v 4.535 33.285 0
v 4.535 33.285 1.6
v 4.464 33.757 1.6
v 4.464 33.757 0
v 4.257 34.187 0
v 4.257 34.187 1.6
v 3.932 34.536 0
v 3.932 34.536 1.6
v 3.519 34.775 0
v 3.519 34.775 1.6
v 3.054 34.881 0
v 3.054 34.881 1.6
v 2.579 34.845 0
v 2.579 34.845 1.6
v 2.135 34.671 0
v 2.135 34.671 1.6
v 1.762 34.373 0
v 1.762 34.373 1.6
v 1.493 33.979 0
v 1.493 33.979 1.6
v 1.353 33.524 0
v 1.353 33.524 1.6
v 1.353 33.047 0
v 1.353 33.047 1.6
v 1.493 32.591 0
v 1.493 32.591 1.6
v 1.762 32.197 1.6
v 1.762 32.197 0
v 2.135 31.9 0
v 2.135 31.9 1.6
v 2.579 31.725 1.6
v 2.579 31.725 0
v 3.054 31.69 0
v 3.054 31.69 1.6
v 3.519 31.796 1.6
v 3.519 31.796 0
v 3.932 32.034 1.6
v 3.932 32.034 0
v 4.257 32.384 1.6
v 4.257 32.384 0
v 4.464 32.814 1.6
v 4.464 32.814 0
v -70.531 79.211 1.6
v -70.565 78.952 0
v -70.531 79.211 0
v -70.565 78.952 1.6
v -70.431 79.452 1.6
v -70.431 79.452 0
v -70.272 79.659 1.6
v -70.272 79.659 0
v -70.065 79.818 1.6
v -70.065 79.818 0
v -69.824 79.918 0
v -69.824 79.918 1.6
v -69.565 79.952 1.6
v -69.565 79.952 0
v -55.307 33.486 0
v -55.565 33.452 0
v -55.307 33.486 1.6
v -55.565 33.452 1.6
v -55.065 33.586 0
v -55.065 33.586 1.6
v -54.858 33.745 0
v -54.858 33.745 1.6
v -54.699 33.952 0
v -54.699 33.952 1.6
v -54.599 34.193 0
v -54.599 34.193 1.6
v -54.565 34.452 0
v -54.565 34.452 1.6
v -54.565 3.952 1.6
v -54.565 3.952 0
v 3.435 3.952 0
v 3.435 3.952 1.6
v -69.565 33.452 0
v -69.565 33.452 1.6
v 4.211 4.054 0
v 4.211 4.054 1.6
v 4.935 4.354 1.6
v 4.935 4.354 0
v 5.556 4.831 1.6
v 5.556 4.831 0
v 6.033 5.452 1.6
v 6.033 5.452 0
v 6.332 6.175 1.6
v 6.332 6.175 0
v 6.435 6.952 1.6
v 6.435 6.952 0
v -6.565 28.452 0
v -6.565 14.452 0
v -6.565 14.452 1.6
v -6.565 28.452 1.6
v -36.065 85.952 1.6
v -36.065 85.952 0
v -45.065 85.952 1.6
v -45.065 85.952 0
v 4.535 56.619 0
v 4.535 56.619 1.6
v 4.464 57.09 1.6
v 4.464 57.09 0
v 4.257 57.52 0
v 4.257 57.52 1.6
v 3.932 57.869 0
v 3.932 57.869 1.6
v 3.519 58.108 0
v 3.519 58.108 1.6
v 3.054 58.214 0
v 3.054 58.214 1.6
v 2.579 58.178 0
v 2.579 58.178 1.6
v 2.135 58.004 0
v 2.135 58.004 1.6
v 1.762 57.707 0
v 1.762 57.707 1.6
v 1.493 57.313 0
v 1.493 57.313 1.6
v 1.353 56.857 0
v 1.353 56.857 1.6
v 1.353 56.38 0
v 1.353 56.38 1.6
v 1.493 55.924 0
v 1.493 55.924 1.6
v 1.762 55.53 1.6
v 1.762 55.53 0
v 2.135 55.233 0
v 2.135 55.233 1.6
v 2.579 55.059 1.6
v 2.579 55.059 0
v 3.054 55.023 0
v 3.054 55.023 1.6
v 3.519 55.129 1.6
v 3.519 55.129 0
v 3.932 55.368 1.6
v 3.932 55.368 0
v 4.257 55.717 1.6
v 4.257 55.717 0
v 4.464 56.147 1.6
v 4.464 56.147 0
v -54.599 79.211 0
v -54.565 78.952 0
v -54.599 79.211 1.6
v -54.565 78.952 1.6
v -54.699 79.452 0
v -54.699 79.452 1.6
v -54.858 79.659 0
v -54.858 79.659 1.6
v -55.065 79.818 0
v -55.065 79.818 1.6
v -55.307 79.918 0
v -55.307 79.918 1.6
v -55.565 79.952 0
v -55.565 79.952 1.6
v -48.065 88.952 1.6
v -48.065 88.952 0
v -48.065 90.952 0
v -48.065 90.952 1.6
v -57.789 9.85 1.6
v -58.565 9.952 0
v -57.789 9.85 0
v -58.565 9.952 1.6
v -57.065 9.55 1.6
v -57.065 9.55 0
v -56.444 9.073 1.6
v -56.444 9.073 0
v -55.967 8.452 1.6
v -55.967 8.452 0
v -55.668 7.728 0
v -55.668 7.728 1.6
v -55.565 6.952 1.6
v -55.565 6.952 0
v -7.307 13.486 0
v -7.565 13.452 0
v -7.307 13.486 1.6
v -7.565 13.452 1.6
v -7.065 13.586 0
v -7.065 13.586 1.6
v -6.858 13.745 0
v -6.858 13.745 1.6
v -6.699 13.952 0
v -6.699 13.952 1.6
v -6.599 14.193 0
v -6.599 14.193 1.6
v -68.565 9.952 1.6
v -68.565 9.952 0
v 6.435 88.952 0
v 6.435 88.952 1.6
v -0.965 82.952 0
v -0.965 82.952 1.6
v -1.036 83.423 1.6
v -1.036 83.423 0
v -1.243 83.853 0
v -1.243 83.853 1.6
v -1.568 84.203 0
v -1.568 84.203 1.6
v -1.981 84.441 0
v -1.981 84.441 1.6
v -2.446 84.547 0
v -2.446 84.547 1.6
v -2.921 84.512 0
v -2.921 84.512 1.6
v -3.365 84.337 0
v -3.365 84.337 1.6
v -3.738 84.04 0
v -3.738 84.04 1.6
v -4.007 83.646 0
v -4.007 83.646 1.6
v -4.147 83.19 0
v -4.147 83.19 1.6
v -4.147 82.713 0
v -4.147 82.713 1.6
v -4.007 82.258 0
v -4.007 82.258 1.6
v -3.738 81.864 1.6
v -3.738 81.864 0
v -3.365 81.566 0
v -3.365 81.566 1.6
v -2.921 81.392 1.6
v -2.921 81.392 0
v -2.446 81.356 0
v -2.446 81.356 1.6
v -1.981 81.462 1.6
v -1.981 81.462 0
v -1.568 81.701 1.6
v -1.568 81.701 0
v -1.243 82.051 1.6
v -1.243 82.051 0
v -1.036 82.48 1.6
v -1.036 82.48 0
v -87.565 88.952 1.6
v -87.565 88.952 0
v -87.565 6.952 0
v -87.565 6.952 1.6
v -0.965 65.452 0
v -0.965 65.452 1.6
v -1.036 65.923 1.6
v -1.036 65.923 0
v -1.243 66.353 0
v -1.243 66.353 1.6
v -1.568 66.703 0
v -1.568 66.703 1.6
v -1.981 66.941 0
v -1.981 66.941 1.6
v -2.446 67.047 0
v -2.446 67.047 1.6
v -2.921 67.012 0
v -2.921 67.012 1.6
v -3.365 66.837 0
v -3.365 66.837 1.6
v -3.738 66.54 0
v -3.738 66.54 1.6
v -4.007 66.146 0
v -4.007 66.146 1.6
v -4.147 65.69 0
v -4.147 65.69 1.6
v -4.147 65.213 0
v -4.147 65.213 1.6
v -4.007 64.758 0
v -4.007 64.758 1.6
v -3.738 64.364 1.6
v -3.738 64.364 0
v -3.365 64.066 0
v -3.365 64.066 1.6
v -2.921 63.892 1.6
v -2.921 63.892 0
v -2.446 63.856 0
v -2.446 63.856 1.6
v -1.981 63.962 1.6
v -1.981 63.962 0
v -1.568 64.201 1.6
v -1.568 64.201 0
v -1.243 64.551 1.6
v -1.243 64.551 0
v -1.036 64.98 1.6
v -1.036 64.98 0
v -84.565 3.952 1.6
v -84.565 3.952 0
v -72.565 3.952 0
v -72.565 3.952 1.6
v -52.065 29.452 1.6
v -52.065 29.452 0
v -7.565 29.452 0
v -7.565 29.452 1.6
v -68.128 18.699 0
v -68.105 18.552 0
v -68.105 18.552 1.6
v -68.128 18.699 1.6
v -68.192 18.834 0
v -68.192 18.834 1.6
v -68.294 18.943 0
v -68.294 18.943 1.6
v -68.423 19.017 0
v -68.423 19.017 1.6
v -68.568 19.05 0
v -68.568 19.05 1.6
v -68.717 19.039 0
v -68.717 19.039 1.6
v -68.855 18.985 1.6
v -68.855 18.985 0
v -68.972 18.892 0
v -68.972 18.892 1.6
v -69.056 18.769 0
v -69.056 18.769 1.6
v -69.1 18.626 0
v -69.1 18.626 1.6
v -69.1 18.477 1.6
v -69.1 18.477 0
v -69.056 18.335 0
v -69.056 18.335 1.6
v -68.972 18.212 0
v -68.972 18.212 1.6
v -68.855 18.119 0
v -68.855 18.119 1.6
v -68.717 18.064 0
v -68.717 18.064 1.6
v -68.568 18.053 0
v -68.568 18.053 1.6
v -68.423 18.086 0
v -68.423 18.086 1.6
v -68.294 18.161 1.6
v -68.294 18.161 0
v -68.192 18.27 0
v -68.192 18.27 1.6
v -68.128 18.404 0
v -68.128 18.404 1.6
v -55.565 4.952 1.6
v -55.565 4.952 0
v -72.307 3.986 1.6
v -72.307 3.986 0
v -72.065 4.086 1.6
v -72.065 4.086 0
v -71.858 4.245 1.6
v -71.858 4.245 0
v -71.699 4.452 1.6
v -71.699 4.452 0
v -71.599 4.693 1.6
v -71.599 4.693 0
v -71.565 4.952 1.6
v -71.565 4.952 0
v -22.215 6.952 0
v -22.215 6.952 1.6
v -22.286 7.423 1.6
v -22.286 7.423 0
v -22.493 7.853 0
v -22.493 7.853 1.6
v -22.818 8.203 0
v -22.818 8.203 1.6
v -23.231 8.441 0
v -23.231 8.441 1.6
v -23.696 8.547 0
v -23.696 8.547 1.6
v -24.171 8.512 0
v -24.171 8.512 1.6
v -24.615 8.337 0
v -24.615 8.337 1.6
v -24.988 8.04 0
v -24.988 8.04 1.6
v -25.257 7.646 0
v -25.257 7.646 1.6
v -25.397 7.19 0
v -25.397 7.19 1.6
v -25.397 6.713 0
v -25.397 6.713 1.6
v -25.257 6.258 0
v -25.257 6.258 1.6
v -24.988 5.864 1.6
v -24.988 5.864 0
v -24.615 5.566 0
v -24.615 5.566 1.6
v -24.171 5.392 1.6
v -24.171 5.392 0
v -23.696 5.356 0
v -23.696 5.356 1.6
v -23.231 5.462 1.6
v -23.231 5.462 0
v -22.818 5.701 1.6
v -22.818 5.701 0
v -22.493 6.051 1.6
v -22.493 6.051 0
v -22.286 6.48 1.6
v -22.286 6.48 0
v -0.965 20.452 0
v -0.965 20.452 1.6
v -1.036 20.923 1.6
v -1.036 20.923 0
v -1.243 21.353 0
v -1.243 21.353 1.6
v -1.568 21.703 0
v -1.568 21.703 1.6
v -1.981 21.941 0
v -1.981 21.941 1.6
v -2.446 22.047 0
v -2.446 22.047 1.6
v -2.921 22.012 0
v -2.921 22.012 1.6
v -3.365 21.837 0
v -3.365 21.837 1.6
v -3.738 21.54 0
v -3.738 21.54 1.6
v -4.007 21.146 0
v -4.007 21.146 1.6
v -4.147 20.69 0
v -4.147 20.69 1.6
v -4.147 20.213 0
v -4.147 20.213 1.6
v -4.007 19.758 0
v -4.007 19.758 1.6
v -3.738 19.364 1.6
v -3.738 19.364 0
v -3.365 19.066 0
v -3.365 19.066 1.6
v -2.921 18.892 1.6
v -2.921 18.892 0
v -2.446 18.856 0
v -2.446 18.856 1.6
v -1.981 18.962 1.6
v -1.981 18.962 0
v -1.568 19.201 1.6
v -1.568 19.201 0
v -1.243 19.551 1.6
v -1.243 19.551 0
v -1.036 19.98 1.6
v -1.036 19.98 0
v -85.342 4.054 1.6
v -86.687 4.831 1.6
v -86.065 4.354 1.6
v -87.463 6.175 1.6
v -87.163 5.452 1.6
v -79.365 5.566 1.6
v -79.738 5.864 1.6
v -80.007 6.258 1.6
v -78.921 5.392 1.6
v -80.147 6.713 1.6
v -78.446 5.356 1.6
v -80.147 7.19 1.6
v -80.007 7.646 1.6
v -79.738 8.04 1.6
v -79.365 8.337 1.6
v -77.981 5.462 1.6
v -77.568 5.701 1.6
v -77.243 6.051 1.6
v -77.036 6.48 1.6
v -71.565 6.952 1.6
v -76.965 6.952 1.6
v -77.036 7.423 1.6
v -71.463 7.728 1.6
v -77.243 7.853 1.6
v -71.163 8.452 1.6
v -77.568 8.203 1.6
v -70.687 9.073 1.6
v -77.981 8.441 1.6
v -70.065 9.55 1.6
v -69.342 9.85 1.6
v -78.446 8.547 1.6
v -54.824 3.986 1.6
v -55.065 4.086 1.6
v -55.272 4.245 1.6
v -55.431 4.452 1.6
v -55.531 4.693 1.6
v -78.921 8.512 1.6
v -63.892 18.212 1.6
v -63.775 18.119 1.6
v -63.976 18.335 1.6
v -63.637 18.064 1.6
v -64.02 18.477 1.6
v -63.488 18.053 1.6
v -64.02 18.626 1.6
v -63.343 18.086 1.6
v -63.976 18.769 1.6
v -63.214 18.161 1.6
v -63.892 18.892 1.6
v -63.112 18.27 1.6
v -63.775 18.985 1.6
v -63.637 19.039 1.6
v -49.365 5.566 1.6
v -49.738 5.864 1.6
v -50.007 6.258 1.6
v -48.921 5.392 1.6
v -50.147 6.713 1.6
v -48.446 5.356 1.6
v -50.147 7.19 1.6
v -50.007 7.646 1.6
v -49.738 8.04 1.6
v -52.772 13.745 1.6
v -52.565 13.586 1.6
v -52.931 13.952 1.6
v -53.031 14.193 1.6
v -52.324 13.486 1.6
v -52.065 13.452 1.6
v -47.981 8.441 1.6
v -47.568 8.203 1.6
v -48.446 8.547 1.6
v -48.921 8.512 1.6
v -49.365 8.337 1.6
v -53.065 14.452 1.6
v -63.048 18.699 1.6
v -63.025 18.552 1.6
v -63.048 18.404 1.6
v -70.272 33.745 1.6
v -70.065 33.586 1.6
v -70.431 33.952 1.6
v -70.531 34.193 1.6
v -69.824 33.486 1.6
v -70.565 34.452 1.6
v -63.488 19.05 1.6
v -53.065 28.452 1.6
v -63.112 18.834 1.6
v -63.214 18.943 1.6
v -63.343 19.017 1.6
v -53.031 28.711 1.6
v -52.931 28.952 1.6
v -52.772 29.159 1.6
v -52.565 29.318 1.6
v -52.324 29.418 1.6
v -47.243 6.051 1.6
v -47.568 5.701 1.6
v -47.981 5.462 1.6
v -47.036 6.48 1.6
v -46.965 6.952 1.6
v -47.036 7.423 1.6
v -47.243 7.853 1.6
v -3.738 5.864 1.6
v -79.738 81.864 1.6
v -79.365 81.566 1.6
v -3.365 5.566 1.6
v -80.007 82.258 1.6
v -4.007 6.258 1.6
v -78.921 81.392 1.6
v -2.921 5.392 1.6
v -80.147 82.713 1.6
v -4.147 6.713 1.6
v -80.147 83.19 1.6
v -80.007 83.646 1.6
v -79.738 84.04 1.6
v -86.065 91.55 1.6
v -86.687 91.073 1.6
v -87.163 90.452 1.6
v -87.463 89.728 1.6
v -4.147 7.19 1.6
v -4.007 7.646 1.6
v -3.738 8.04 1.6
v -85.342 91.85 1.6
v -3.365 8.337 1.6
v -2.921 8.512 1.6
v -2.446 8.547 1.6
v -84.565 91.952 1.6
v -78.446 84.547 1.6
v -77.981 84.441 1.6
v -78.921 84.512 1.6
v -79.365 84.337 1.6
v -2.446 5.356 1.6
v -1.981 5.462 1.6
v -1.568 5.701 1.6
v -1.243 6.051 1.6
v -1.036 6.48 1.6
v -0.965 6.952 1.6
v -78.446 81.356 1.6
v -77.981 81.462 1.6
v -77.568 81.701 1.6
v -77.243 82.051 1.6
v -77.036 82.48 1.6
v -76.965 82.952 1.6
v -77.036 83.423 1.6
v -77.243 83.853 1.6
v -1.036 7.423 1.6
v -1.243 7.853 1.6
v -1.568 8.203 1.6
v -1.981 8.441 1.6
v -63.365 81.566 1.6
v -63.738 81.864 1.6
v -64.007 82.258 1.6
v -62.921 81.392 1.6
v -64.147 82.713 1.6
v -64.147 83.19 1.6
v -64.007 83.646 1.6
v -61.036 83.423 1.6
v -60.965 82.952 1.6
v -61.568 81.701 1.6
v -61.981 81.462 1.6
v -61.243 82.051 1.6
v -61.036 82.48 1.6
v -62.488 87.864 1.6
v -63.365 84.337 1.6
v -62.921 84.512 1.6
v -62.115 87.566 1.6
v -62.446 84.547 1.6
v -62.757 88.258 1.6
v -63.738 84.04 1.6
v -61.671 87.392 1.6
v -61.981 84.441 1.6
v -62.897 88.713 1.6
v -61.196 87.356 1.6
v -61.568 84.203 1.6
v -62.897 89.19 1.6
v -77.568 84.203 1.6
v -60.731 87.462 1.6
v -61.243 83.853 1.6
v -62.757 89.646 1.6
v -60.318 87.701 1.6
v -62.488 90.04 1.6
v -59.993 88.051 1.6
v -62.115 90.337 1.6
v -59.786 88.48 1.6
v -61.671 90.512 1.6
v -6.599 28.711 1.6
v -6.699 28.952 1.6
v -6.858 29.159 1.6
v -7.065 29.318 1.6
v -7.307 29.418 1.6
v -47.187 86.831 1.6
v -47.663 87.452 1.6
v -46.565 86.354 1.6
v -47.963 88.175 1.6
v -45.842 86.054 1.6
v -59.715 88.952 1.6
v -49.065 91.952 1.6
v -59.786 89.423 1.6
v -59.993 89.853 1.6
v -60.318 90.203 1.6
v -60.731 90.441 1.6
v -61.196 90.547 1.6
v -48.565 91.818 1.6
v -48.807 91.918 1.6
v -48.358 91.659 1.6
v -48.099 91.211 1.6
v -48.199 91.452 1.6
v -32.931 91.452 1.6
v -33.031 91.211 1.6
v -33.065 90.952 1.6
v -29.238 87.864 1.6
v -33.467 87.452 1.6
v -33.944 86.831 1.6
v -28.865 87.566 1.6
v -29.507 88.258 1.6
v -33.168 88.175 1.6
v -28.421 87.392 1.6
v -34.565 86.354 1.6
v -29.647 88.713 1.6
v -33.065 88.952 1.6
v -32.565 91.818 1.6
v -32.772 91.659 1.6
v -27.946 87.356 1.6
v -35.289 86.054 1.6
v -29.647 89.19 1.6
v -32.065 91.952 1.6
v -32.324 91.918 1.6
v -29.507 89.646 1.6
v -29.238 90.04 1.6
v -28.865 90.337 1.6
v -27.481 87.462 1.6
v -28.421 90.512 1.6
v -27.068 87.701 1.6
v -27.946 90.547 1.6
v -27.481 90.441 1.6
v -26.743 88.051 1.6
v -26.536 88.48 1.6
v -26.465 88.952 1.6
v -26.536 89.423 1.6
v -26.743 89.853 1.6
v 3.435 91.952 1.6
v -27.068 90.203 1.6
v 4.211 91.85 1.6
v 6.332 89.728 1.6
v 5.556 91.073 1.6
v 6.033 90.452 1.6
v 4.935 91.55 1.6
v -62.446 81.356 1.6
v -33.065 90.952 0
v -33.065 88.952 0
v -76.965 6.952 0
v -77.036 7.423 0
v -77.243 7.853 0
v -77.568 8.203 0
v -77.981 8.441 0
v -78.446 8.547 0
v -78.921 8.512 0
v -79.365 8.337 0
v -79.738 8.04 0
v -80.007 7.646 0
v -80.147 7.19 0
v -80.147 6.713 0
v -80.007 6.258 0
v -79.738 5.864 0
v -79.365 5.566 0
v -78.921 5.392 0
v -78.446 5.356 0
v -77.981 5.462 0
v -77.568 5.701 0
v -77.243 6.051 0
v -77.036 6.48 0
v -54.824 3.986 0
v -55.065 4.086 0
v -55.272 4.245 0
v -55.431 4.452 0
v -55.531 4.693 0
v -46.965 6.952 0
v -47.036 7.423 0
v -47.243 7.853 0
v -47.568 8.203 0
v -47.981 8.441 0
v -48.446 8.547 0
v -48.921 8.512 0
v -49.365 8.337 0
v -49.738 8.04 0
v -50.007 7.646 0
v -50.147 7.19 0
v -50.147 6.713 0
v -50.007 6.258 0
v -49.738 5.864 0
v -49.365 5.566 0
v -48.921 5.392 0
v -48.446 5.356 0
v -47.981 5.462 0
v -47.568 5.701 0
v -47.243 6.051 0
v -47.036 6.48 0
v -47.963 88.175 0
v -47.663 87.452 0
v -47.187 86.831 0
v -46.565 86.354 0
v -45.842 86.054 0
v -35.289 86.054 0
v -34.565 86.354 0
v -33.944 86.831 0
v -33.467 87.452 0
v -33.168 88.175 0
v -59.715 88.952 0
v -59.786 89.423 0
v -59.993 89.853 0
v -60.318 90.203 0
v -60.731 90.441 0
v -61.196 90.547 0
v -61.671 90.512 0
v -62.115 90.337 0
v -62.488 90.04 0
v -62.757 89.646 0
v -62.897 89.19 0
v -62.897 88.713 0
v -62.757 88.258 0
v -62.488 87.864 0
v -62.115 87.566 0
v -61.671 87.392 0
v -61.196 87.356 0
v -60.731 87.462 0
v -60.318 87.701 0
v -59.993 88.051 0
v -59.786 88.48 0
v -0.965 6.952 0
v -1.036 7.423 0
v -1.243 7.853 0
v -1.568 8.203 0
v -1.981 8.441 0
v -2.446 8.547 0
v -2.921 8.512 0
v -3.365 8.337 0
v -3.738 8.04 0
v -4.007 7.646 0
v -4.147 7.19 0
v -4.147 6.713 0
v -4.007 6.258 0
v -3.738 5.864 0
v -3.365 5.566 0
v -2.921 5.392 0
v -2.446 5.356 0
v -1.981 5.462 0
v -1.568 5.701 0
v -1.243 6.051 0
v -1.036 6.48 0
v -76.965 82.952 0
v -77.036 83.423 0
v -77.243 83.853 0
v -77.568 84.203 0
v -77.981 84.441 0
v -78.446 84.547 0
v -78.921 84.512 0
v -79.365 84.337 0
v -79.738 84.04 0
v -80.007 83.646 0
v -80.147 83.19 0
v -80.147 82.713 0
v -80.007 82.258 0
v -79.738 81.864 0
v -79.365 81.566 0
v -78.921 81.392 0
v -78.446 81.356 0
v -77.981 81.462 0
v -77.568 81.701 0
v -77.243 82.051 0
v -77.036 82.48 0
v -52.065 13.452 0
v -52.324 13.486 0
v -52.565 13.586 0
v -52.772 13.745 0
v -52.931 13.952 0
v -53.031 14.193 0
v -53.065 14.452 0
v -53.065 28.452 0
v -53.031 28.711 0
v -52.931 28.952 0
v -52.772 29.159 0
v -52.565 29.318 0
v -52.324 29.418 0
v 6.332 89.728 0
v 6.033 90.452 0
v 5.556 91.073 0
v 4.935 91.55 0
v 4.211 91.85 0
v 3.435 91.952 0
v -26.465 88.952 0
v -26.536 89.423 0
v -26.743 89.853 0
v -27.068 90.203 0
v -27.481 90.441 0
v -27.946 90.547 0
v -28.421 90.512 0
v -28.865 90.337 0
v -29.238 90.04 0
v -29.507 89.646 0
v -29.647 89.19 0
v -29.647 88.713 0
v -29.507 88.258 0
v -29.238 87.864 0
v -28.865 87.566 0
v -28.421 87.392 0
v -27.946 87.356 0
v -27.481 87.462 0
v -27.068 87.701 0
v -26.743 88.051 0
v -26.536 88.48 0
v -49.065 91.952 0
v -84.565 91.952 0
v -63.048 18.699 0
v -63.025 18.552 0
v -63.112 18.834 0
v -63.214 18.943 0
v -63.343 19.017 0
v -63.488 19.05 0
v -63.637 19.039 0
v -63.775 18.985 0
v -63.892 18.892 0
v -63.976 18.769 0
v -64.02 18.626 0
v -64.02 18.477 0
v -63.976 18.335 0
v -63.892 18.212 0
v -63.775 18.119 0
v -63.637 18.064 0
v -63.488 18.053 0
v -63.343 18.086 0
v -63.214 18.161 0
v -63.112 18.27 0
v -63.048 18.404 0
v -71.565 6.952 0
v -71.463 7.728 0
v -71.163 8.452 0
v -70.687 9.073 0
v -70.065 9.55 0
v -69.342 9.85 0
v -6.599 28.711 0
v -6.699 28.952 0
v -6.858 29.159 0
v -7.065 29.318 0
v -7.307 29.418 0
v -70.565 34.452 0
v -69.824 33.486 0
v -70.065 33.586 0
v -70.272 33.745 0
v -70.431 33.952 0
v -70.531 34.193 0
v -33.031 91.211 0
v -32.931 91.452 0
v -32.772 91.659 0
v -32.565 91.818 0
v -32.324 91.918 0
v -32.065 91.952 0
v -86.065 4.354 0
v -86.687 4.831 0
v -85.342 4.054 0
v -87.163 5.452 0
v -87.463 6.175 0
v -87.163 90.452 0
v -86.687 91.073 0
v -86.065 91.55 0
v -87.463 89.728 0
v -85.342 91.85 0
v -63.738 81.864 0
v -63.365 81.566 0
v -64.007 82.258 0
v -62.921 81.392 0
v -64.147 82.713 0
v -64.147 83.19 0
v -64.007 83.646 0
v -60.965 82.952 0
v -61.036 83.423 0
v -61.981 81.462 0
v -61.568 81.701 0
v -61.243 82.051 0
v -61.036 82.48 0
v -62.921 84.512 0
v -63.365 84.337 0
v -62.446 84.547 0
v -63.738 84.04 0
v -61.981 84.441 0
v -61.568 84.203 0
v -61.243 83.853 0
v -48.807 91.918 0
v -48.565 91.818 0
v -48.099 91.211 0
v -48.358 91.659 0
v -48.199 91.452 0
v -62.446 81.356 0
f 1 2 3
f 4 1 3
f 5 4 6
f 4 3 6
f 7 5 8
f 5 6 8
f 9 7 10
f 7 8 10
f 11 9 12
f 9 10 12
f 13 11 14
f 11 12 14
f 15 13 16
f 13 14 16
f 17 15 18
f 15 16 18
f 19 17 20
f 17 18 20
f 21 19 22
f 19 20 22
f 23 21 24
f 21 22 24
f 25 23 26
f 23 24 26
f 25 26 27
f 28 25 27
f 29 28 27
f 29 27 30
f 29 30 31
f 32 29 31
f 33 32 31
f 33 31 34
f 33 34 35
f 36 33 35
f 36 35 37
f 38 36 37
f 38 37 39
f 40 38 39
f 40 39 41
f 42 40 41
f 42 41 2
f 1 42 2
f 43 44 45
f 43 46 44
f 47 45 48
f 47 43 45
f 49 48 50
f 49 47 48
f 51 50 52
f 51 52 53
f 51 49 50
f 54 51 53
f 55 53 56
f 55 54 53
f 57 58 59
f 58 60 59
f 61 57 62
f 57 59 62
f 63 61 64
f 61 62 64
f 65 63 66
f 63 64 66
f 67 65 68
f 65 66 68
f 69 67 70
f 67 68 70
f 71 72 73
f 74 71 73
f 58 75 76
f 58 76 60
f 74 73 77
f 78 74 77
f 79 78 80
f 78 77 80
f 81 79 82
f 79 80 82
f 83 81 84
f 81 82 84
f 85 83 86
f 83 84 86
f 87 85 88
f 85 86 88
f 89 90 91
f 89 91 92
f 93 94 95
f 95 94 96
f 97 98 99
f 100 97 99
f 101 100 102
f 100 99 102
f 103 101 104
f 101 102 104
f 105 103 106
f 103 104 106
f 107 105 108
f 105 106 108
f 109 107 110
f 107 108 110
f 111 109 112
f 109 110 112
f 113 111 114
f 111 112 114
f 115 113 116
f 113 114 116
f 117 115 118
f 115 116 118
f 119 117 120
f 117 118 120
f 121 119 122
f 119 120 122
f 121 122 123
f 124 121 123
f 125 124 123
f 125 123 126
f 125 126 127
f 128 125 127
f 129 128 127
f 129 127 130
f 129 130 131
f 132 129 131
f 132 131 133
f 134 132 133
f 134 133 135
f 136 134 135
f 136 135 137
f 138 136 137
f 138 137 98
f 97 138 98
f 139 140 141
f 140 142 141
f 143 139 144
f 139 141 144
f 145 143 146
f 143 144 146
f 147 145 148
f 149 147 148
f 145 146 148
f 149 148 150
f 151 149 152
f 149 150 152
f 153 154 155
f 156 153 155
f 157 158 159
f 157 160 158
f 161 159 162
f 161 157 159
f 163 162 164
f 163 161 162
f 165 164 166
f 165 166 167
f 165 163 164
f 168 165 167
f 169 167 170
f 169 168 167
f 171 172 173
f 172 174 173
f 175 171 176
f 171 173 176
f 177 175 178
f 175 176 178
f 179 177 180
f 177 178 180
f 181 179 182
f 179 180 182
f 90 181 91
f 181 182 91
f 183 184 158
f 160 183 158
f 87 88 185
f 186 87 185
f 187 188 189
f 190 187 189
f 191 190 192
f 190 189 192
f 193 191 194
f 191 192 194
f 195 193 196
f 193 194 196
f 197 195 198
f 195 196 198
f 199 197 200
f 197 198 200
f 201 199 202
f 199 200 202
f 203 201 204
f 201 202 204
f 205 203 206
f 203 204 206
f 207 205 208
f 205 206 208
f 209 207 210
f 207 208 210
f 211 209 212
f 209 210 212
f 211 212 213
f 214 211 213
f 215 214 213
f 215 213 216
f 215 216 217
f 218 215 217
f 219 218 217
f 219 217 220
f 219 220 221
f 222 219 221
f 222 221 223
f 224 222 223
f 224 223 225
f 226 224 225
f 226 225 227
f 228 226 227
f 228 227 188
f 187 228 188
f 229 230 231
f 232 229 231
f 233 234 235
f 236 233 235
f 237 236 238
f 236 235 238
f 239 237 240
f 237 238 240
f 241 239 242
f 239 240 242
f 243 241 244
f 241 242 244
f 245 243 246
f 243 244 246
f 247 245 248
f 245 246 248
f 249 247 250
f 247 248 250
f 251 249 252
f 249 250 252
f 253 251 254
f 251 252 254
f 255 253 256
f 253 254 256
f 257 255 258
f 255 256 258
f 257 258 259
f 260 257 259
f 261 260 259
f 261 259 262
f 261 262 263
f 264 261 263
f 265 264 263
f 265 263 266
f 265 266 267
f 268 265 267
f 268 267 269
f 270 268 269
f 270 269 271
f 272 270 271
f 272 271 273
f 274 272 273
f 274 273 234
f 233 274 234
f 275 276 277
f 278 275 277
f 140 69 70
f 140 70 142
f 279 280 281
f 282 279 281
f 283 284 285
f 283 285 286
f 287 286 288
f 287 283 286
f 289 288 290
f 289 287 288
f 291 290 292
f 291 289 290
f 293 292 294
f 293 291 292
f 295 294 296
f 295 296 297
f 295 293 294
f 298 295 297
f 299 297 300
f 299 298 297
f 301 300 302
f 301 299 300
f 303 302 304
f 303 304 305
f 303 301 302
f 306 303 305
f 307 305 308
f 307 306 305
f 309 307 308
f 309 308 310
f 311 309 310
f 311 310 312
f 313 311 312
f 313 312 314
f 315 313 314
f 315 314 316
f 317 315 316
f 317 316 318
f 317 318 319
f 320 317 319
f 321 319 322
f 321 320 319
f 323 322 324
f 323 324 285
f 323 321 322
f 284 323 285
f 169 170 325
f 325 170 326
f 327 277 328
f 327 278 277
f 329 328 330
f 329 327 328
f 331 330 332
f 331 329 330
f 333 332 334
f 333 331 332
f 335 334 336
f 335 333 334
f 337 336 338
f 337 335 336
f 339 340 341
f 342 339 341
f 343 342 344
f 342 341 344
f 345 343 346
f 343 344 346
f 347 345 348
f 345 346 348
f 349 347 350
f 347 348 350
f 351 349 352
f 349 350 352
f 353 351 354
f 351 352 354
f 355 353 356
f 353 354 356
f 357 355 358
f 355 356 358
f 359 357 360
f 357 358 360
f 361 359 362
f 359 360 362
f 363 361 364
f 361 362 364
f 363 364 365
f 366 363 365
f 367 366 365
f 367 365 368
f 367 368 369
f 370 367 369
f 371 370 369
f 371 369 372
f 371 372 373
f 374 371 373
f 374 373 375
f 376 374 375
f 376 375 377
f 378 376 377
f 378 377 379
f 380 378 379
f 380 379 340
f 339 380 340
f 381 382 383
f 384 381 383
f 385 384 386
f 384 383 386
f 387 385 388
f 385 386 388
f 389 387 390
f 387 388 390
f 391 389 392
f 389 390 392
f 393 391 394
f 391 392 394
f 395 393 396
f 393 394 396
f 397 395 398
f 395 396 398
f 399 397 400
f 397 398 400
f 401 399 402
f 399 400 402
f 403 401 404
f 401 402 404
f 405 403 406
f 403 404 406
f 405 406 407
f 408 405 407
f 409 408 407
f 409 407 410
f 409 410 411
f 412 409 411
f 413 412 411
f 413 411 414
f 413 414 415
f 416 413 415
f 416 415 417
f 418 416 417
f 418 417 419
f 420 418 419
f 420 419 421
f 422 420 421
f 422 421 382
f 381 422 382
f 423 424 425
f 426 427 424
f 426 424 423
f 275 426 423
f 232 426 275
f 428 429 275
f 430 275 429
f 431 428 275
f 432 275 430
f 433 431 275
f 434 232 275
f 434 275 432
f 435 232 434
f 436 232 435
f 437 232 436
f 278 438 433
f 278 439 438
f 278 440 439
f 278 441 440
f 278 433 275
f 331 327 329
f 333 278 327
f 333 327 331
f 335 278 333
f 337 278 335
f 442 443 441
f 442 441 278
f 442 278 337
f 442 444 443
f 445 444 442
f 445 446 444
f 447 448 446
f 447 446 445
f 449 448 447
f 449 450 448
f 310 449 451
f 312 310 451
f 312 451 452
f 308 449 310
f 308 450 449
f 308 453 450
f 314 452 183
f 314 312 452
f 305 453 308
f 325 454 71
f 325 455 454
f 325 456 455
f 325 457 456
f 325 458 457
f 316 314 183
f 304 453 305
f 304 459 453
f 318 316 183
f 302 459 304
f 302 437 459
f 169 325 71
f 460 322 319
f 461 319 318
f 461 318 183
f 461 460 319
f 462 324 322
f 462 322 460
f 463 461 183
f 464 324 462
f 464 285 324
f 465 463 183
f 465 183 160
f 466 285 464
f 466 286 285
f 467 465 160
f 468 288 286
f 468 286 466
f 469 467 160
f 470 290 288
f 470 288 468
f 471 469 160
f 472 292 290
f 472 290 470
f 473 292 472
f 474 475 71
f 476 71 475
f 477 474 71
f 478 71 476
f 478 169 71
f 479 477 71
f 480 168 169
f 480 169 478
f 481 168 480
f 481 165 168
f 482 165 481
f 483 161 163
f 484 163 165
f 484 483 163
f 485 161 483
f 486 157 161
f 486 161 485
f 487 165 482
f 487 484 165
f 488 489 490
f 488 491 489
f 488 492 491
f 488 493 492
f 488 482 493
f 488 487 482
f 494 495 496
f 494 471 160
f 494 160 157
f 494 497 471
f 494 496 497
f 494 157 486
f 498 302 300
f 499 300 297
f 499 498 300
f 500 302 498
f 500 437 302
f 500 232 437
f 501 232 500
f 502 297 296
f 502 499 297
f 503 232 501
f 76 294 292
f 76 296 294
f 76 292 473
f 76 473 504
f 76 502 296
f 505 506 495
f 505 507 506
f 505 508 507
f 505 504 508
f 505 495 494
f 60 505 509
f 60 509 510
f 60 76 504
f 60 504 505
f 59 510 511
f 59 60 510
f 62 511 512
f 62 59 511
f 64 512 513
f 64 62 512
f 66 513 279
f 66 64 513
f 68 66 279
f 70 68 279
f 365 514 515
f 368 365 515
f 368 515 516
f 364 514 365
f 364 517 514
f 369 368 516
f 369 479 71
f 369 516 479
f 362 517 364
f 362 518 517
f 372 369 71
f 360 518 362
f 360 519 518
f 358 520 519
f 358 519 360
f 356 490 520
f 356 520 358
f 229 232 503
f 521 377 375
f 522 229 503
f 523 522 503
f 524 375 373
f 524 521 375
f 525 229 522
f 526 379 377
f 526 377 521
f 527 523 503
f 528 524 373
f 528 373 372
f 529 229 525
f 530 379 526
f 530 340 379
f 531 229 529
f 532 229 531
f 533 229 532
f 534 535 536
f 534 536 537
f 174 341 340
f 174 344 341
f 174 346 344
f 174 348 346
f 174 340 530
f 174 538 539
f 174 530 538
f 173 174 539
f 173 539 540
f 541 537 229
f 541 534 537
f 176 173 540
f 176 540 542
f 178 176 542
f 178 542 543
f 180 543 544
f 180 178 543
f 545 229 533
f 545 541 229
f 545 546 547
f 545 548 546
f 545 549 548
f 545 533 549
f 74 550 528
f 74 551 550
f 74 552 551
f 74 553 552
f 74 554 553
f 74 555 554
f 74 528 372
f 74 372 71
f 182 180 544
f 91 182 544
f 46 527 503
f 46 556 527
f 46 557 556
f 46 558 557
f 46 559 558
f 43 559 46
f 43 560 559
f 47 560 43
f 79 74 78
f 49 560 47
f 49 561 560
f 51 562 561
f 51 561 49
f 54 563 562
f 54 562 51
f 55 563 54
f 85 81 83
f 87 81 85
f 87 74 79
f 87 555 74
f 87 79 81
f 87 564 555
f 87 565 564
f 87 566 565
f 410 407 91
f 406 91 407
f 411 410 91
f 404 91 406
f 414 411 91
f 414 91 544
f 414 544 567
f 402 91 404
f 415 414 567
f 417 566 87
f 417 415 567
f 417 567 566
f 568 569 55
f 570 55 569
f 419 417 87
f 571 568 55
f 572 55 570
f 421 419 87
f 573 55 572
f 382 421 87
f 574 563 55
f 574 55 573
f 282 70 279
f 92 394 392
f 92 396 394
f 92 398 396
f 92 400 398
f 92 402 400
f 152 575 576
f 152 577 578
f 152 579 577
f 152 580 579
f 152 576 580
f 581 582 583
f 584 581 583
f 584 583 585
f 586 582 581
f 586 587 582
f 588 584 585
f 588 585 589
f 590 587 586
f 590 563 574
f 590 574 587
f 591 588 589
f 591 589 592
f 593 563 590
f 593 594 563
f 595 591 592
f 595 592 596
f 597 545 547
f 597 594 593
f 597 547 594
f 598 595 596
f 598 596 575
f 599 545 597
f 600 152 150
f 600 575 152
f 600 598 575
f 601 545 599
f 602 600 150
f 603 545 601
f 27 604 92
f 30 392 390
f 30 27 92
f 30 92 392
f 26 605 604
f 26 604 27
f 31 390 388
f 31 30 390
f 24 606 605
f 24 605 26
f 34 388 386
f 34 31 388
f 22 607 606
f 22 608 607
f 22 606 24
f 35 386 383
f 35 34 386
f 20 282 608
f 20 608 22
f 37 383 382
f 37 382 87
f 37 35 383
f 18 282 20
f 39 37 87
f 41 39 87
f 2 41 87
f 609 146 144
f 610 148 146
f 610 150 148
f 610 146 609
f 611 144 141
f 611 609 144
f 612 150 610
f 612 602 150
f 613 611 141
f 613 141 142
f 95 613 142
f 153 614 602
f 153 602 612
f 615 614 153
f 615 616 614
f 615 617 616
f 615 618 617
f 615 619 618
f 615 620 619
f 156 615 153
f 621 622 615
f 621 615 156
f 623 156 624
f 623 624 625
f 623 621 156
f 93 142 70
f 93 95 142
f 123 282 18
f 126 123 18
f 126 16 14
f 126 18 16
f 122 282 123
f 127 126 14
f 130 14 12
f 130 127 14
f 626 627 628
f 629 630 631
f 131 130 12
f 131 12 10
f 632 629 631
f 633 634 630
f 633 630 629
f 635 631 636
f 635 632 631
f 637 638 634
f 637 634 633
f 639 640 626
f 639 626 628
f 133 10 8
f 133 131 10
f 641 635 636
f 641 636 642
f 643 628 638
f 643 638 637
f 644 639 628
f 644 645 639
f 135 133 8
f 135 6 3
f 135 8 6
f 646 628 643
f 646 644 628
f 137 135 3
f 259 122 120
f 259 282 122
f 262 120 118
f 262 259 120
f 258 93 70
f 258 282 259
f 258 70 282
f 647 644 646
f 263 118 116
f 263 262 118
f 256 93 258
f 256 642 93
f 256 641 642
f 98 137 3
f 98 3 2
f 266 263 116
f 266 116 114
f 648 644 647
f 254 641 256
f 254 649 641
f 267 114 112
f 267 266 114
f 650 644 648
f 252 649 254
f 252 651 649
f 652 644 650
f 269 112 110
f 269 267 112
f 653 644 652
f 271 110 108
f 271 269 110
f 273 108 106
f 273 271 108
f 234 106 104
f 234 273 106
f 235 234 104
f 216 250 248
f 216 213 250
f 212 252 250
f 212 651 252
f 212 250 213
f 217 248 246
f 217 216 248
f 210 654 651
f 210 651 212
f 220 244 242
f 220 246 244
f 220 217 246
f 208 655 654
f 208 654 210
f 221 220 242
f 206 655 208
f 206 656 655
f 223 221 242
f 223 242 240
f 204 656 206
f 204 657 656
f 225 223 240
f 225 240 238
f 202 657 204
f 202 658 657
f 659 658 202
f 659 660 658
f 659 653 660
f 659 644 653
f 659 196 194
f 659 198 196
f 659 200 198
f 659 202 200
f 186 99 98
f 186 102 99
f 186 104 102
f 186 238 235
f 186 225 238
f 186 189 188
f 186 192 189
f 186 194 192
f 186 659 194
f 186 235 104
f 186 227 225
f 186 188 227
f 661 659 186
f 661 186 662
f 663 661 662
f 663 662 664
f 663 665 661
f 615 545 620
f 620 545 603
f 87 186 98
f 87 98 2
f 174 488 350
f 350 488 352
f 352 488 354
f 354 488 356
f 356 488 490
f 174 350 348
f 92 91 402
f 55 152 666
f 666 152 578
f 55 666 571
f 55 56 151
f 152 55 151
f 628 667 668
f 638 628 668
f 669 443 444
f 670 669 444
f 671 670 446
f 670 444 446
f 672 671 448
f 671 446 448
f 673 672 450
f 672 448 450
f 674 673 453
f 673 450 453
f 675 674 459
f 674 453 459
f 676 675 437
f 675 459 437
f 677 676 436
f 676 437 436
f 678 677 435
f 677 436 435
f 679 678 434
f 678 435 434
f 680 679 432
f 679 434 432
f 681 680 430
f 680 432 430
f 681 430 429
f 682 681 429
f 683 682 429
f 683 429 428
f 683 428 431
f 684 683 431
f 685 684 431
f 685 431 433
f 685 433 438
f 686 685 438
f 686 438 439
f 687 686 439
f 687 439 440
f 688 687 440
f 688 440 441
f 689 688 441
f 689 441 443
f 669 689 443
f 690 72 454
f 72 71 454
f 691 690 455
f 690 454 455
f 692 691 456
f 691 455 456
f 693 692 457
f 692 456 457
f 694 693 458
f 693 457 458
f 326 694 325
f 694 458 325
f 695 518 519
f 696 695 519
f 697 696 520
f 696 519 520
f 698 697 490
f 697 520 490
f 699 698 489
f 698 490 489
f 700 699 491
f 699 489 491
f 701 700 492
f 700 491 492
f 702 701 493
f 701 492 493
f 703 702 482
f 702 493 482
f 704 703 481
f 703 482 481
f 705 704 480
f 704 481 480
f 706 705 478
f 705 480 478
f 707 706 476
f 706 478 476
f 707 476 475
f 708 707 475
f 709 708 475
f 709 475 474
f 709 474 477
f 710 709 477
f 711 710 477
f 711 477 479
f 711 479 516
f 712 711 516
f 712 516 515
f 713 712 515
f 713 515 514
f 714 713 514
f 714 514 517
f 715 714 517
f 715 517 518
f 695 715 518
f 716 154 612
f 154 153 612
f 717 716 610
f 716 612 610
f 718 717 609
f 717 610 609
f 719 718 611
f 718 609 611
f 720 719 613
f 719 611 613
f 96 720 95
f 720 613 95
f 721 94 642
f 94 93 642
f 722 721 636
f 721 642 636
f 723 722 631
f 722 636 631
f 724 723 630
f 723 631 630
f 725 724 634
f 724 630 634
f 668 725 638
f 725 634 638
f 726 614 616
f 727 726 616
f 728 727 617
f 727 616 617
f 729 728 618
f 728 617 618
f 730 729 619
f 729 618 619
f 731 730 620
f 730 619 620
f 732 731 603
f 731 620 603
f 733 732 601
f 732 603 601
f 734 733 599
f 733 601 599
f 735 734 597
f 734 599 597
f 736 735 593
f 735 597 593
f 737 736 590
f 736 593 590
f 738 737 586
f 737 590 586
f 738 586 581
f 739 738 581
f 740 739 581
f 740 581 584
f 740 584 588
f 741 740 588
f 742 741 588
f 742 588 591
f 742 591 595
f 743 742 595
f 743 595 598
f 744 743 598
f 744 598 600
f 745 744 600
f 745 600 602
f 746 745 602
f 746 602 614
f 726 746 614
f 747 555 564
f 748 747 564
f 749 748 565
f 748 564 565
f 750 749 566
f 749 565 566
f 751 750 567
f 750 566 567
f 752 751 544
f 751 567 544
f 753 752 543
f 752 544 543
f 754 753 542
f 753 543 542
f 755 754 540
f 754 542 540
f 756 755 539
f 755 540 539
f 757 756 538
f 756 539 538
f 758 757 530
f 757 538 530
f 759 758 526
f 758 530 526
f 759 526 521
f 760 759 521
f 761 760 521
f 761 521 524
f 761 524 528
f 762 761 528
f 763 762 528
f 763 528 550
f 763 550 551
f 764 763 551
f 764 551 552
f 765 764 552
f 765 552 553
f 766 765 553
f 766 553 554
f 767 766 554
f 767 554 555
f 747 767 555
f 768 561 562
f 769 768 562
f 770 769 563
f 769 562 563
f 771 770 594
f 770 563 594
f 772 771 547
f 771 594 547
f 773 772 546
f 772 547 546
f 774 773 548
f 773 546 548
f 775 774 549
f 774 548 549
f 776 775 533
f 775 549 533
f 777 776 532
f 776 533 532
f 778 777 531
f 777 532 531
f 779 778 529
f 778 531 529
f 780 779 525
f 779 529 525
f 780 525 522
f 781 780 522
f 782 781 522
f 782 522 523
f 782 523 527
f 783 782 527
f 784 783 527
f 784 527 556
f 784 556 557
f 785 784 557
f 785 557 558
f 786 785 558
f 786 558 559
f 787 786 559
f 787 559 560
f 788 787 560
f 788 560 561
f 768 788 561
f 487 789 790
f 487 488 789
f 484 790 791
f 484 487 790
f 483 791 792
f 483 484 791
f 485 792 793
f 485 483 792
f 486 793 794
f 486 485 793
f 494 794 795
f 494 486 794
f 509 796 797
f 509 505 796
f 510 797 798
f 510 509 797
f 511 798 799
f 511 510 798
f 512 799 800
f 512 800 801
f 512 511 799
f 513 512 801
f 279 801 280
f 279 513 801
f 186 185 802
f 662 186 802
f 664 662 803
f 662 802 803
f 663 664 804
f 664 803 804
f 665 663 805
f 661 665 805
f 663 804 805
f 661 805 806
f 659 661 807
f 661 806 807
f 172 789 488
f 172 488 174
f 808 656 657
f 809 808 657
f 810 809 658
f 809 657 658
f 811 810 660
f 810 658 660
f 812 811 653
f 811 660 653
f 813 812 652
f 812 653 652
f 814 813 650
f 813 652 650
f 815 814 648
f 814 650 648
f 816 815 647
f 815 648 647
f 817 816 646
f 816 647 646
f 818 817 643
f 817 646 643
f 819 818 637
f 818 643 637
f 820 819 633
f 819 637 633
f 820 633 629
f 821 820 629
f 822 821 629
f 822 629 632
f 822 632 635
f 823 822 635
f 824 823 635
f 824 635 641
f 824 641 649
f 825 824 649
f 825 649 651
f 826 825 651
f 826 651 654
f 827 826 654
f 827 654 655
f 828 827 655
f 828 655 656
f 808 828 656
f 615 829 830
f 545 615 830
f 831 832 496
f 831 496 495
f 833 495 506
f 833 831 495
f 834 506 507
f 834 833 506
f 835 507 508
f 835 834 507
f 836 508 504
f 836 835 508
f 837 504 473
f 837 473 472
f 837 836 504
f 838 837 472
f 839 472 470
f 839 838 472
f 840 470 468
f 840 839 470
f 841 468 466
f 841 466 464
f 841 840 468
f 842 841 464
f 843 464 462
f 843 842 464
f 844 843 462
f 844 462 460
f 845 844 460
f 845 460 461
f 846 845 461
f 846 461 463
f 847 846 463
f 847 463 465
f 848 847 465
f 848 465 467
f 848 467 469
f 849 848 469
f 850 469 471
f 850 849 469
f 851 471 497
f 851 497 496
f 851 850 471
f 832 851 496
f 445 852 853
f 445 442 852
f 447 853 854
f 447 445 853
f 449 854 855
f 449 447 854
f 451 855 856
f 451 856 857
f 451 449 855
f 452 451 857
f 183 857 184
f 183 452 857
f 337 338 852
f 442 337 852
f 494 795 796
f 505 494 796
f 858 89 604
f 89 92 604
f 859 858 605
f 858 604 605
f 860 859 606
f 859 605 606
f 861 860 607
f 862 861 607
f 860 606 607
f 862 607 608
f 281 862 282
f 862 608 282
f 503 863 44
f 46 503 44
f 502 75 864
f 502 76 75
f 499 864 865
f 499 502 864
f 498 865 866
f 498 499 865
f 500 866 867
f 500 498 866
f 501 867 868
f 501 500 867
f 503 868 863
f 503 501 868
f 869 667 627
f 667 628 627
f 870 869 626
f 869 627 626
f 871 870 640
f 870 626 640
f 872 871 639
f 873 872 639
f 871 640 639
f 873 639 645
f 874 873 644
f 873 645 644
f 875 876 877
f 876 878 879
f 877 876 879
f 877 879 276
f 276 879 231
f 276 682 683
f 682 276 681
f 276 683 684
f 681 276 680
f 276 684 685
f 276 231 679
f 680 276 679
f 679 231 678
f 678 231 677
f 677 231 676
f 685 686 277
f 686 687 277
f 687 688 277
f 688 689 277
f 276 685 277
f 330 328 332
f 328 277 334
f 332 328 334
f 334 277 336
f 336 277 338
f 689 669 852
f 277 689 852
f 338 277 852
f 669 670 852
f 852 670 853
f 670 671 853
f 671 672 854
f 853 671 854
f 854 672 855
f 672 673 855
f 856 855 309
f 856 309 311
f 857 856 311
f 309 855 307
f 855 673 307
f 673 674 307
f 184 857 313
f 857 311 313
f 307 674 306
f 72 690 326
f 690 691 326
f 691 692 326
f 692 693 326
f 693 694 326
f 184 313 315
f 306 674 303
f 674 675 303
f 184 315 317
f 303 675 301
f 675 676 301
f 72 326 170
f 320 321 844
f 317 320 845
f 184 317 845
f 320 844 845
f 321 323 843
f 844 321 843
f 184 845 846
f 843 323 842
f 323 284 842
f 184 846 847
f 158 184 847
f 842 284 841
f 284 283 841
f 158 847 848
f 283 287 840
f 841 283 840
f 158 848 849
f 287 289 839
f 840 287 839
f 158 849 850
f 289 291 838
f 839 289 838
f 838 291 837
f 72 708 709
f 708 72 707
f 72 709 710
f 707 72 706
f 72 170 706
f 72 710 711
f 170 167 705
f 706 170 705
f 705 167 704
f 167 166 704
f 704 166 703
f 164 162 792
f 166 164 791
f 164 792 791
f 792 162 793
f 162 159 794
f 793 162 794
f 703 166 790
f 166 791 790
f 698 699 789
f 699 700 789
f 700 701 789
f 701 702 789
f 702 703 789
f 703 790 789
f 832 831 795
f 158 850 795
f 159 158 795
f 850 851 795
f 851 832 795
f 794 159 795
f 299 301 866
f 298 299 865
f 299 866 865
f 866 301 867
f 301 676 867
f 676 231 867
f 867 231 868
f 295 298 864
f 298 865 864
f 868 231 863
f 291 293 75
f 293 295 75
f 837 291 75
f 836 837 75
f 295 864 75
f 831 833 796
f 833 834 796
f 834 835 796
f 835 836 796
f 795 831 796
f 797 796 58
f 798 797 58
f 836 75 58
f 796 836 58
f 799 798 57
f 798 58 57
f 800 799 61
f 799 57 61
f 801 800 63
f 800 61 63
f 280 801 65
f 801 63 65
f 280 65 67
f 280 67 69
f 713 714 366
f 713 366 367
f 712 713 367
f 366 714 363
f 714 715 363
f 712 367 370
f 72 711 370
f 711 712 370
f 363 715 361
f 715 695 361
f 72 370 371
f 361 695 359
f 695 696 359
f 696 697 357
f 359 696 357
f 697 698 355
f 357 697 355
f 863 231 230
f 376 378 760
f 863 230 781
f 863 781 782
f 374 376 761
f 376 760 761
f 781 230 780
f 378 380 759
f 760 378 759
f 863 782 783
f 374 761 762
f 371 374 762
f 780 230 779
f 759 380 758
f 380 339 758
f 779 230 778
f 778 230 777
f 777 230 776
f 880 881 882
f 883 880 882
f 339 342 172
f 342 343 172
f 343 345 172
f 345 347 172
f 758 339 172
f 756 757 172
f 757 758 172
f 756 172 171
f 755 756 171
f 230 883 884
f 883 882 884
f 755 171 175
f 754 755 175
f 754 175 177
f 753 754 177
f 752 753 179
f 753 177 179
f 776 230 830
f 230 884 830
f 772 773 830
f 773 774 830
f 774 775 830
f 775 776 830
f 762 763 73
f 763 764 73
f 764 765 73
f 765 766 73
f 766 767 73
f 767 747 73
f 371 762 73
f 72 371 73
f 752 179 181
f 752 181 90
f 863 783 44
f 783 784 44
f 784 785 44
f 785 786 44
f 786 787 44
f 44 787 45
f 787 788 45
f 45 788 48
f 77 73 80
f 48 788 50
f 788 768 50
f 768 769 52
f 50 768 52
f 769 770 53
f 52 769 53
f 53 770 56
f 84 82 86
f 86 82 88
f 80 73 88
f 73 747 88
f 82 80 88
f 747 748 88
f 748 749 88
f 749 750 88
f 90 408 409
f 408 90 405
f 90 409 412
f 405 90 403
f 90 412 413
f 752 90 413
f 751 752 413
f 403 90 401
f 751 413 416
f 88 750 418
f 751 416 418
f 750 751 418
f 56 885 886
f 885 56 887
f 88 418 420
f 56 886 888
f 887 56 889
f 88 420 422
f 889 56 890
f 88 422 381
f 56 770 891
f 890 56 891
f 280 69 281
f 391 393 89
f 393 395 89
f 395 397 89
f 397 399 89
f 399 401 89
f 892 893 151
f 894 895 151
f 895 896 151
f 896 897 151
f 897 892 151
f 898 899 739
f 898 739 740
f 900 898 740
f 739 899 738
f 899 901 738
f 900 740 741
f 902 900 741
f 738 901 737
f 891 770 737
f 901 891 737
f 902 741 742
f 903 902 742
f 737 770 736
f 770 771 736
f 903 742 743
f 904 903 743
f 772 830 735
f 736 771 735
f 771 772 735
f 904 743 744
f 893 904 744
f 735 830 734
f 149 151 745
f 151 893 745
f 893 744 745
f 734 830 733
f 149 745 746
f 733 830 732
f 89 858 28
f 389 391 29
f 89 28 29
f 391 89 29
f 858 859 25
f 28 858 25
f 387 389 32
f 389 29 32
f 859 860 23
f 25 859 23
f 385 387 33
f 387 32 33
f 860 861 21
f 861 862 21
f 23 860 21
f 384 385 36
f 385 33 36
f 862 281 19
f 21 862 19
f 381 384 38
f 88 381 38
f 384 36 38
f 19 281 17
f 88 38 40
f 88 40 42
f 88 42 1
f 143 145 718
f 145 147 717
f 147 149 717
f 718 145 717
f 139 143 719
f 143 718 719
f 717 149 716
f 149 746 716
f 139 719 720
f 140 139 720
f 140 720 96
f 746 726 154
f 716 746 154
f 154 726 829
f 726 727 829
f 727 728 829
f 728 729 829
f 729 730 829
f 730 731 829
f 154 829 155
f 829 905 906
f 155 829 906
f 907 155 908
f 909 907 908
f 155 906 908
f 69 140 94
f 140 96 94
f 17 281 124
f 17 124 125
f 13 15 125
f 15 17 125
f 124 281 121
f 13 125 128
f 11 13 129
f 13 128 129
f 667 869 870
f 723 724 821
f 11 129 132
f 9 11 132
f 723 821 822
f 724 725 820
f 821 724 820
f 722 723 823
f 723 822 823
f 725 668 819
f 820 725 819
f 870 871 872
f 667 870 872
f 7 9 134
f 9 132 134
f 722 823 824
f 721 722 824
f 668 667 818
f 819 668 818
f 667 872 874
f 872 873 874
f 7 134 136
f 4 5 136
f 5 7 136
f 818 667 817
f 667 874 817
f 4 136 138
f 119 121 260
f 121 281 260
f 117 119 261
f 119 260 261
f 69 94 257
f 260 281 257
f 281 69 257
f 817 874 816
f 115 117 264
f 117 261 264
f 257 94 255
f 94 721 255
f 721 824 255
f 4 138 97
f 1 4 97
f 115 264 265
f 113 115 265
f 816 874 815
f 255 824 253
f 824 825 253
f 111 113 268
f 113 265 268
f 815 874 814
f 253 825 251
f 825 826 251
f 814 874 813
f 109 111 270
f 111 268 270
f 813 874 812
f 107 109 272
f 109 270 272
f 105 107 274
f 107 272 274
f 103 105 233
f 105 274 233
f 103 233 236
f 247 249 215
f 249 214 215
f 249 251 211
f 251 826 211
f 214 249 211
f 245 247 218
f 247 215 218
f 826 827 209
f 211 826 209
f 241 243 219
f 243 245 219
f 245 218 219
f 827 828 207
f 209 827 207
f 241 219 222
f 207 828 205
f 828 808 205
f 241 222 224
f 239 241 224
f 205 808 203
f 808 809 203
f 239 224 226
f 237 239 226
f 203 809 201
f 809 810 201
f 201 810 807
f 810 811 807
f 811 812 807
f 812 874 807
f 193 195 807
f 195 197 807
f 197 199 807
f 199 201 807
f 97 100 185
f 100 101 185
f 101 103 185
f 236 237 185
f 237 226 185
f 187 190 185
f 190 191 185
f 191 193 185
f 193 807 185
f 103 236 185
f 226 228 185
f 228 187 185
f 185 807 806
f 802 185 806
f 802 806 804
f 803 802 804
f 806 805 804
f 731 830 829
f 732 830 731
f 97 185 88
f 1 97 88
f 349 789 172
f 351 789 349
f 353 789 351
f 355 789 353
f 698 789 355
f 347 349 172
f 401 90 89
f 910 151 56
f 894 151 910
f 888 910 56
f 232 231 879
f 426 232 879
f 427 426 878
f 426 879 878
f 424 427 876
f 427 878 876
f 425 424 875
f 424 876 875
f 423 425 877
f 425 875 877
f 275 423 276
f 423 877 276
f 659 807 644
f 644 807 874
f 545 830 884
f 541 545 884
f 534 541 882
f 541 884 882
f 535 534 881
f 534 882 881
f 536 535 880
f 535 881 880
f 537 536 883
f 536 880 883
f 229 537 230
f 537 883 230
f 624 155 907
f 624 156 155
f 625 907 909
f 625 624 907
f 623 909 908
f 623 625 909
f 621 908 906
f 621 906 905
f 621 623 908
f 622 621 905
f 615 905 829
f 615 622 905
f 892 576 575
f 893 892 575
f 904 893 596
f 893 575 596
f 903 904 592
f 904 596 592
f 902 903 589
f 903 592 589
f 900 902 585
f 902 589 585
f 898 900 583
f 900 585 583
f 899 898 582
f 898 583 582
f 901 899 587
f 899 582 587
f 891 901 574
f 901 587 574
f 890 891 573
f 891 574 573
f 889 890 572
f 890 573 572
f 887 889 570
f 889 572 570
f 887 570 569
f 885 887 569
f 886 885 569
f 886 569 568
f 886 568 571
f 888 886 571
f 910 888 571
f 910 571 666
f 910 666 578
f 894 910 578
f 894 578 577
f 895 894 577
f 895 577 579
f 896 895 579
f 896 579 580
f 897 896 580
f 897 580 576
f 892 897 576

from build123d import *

# Parameters (mm, degrees)
SKETCH1_R                  = 0.5
SKETCH1_W                  = 46.5
SKETCH1_H                  = 16
SKETCH1_W_2                = 16
SKETCH1_H_2                = 46.5
BOSS_EXTRUDE1_DEPTH        = 1.6
F_3_2_3_2_DIAMETER_HOLE3_D = 3.2
FILLET1_R                  = 3
FILLET2_R                  = 1


with BuildPart() as part:
    # Sketch1 → Boss-Extrude1 (new body)
    with BuildSketch(Plane.XY):
        with BuildLine():
            Line((-87.56534388, 88.95185693), (-87.56534388, 6.95185693))
            ThreePointArc((-87.56534388, 6.95185693), (-86.686664224, 4.830536587), (-84.56534388, 3.95185693))
            Line((-84.56534388, 3.95185693), (-71.56534388, 3.95185693))
            Line((-71.56534388, 3.95185693), (-71.56534388, 9.95185693))
            Line((-71.56534388, 9.95185693), (-55.56534388, 9.95185693))
            Line((-55.56534388, 9.95185693), (-55.56534388, 3.95185693))
            Line((-55.56534388, 3.95185693), (3.43465612, 3.95185693))
            ThreePointArc((3.43465612, 3.95185693), (5.555976464, 4.830536587), (6.43465612, 6.95185693))
            Line((6.43465612, 6.95185693), (6.43465612, 88.95185693))
            ThreePointArc((6.43465612, 88.95185693), (5.555976464, 91.073177274), (3.43465612, 91.95185693))
            Line((3.43465612, 91.95185693), (-33.06534388, 91.95185693))
            Line((-33.06534388, 91.95185693), (-33.06534388, 85.95185693))
            Line((-33.06534388, 85.95185693), (-48.06534388, 85.95185693))
            Line((-48.06534388, 85.95185693), (-48.06534388, 91.95185693))
            Line((-48.06534388, 91.95185693), (-84.56534388, 91.95185693))
            ThreePointArc((-84.56534388, 91.95185693), (-86.686664224, 91.073177274), (-87.56534388, 88.95185693))
        make_face()
        with Locations((-63.52534388, 18.55185693)):
            Circle(SKETCH1_R, mode=Mode.SUBTRACT)
        with Locations((-68.60534388, 18.55185693)):
            Circle(SKETCH1_R, mode=Mode.SUBTRACT)
        with Locations((-29.81534388, 21.45185693)):
            Rectangle(SKETCH1_W, SKETCH1_H, mode=Mode.SUBTRACT)
        with Locations((-62.56534388, 56.70185693)):
            Rectangle(SKETCH1_W_2, SKETCH1_H_2, mode=Mode.SUBTRACT)
    extrude(amount=BOSS_EXTRUDE1_DEPTH)

    # Ø3.2 (3.2) Diameter Hole3 (through all)
    with Locations(Plane(origin=(0, 0, 0), x_dir=(-1, 0, 0), z_dir=(0, 0, -1))):
        with Locations((78.56534388, 6.95185693), (78.56534388, 82.95185693), (2.56534388, 82.95185693), (2.56534388, 6.95185693), (2.56534388, 65.45185693), (2.56534388, 20.45185693), (62.56534388, 82.95185693), (48.56534388, 6.95185693), (28.06534388, 88.95185693), (61.31534388, 88.95185693), (-2.93465612, 56.618523597), (-2.93465612, 33.285190263), (23.81534388, 6.95185693)):
            Hole(F_3_2_3_2_DIAMETER_HOLE3_D / 2)

    # Fillet1
    fillet1_edges = [part.edges().sort_by_distance(p)[0] for p in [
        (-48.06534388, 85.95185693, 0.8),
        (-33.06534388, 85.95185693, 0.8),
        (-55.56534388, 9.95185693, 0.8),
        (-71.56534388, 9.95185693, 0.8),
    ]]
    fillet(fillet1_edges, radius=FILLET1_R)

    # Fillet2
    fillet2_edges = [part.edges().sort_by_distance(p)[0] for p in [
        (-48.06534388, 91.95185693, 0.8),
        (-33.06534388, 91.95185693, 0.8),
        (-55.56534388, 3.95185693, 0.8),
        (-71.56534388, 3.95185693, 0.8),
        (-6.56534388, 13.45185693, 0.8),
        (-6.56534388, 29.45185693, 0.8),
        (-53.06534388, 29.45185693, 0.8),
        (-53.06534388, 13.45185693, 0.8),
        (-54.56534388, 33.45185693, 0.8),
        (-54.56534388, 79.95185693, 0.8),
        (-70.56534388, 79.95185693, 0.8),
        (-70.56534388, 33.45185693, 0.8),
    ]]
    fillet(fillet2_edges, radius=FILLET2_R)


solid = part.part
